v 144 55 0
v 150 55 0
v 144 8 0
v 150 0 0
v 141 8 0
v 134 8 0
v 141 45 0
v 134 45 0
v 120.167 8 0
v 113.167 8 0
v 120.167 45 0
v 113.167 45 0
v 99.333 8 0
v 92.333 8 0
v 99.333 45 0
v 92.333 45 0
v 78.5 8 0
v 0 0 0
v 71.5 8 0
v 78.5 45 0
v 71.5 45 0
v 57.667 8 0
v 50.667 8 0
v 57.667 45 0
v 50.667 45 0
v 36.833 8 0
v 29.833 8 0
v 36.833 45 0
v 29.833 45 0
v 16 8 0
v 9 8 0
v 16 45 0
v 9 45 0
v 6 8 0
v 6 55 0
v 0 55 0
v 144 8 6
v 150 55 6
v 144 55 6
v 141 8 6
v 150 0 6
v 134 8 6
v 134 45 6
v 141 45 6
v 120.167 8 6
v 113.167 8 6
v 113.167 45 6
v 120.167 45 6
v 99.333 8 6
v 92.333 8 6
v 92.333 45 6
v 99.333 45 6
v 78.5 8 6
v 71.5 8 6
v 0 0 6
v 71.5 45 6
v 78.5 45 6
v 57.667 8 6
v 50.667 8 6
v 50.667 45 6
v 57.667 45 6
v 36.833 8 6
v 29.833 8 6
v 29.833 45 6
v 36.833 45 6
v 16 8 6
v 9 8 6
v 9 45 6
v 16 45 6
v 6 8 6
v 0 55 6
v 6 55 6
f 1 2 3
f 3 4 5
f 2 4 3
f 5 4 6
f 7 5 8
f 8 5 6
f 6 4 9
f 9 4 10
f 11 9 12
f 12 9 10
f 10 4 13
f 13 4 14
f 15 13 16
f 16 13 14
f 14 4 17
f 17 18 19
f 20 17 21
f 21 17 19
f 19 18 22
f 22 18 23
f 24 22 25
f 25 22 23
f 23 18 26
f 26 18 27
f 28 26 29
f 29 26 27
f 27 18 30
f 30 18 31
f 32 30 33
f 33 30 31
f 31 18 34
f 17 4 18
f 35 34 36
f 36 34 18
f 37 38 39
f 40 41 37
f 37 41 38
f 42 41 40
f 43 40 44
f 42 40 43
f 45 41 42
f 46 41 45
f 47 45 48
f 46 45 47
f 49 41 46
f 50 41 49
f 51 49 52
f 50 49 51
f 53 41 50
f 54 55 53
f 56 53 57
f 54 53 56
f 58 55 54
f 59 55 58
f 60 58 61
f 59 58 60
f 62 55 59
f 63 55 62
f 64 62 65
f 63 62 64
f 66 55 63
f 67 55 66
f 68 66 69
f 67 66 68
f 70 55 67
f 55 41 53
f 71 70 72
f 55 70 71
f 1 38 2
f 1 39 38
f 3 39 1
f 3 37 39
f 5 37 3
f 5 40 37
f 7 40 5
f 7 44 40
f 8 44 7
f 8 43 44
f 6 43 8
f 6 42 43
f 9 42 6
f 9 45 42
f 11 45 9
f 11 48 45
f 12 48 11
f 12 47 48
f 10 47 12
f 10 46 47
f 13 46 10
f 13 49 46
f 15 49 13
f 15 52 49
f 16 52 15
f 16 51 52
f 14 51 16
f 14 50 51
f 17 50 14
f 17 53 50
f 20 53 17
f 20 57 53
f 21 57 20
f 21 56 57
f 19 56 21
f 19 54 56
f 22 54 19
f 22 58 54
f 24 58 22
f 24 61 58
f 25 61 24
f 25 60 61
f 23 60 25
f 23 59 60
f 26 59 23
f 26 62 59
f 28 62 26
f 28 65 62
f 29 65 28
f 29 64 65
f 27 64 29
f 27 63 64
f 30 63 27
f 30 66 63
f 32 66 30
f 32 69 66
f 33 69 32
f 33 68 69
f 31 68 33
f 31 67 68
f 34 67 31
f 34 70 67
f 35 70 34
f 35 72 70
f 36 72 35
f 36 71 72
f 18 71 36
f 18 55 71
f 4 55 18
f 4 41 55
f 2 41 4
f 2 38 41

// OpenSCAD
$fn = 32;

// ----------------------------------------------------------------------
// Guard grille: 7 slats over a 150 x 55 mm plate
// ----------------------------------------------------------------------

// --- parameters (mm) ---
profile_height = 6;       // extrusion height
profile_points = 36;      // points of the closed outline

profile = [[0, 0], [150, 0], [150, 55], [144, 55], [144, 8], [141, 8], [141, 45], [134, 45], [134, 8], [120.167, 8], [120.167, 45], [113.167, 45], [113.167, 8], [99.333, 8], [99.333, 45], [92.333, 45], [92.333, 8], [78.5, 8], [78.5, 45], [71.5, 45], [71.5, 8], [57.667, 8], [57.667, 45], [50.667, 45], [50.667, 8], [36.833, 8], [36.833, 45], [29.833, 45], [29.833, 8], [16, 8], [16, 45], [9, 45], [9, 8], [6, 8], [6, 55], [0, 55]];  // single closed polygon, 36 points, counter clockwise

// --- the one profile operation ---
linear_extrude(height = profile_height) polygon(points = profile);
